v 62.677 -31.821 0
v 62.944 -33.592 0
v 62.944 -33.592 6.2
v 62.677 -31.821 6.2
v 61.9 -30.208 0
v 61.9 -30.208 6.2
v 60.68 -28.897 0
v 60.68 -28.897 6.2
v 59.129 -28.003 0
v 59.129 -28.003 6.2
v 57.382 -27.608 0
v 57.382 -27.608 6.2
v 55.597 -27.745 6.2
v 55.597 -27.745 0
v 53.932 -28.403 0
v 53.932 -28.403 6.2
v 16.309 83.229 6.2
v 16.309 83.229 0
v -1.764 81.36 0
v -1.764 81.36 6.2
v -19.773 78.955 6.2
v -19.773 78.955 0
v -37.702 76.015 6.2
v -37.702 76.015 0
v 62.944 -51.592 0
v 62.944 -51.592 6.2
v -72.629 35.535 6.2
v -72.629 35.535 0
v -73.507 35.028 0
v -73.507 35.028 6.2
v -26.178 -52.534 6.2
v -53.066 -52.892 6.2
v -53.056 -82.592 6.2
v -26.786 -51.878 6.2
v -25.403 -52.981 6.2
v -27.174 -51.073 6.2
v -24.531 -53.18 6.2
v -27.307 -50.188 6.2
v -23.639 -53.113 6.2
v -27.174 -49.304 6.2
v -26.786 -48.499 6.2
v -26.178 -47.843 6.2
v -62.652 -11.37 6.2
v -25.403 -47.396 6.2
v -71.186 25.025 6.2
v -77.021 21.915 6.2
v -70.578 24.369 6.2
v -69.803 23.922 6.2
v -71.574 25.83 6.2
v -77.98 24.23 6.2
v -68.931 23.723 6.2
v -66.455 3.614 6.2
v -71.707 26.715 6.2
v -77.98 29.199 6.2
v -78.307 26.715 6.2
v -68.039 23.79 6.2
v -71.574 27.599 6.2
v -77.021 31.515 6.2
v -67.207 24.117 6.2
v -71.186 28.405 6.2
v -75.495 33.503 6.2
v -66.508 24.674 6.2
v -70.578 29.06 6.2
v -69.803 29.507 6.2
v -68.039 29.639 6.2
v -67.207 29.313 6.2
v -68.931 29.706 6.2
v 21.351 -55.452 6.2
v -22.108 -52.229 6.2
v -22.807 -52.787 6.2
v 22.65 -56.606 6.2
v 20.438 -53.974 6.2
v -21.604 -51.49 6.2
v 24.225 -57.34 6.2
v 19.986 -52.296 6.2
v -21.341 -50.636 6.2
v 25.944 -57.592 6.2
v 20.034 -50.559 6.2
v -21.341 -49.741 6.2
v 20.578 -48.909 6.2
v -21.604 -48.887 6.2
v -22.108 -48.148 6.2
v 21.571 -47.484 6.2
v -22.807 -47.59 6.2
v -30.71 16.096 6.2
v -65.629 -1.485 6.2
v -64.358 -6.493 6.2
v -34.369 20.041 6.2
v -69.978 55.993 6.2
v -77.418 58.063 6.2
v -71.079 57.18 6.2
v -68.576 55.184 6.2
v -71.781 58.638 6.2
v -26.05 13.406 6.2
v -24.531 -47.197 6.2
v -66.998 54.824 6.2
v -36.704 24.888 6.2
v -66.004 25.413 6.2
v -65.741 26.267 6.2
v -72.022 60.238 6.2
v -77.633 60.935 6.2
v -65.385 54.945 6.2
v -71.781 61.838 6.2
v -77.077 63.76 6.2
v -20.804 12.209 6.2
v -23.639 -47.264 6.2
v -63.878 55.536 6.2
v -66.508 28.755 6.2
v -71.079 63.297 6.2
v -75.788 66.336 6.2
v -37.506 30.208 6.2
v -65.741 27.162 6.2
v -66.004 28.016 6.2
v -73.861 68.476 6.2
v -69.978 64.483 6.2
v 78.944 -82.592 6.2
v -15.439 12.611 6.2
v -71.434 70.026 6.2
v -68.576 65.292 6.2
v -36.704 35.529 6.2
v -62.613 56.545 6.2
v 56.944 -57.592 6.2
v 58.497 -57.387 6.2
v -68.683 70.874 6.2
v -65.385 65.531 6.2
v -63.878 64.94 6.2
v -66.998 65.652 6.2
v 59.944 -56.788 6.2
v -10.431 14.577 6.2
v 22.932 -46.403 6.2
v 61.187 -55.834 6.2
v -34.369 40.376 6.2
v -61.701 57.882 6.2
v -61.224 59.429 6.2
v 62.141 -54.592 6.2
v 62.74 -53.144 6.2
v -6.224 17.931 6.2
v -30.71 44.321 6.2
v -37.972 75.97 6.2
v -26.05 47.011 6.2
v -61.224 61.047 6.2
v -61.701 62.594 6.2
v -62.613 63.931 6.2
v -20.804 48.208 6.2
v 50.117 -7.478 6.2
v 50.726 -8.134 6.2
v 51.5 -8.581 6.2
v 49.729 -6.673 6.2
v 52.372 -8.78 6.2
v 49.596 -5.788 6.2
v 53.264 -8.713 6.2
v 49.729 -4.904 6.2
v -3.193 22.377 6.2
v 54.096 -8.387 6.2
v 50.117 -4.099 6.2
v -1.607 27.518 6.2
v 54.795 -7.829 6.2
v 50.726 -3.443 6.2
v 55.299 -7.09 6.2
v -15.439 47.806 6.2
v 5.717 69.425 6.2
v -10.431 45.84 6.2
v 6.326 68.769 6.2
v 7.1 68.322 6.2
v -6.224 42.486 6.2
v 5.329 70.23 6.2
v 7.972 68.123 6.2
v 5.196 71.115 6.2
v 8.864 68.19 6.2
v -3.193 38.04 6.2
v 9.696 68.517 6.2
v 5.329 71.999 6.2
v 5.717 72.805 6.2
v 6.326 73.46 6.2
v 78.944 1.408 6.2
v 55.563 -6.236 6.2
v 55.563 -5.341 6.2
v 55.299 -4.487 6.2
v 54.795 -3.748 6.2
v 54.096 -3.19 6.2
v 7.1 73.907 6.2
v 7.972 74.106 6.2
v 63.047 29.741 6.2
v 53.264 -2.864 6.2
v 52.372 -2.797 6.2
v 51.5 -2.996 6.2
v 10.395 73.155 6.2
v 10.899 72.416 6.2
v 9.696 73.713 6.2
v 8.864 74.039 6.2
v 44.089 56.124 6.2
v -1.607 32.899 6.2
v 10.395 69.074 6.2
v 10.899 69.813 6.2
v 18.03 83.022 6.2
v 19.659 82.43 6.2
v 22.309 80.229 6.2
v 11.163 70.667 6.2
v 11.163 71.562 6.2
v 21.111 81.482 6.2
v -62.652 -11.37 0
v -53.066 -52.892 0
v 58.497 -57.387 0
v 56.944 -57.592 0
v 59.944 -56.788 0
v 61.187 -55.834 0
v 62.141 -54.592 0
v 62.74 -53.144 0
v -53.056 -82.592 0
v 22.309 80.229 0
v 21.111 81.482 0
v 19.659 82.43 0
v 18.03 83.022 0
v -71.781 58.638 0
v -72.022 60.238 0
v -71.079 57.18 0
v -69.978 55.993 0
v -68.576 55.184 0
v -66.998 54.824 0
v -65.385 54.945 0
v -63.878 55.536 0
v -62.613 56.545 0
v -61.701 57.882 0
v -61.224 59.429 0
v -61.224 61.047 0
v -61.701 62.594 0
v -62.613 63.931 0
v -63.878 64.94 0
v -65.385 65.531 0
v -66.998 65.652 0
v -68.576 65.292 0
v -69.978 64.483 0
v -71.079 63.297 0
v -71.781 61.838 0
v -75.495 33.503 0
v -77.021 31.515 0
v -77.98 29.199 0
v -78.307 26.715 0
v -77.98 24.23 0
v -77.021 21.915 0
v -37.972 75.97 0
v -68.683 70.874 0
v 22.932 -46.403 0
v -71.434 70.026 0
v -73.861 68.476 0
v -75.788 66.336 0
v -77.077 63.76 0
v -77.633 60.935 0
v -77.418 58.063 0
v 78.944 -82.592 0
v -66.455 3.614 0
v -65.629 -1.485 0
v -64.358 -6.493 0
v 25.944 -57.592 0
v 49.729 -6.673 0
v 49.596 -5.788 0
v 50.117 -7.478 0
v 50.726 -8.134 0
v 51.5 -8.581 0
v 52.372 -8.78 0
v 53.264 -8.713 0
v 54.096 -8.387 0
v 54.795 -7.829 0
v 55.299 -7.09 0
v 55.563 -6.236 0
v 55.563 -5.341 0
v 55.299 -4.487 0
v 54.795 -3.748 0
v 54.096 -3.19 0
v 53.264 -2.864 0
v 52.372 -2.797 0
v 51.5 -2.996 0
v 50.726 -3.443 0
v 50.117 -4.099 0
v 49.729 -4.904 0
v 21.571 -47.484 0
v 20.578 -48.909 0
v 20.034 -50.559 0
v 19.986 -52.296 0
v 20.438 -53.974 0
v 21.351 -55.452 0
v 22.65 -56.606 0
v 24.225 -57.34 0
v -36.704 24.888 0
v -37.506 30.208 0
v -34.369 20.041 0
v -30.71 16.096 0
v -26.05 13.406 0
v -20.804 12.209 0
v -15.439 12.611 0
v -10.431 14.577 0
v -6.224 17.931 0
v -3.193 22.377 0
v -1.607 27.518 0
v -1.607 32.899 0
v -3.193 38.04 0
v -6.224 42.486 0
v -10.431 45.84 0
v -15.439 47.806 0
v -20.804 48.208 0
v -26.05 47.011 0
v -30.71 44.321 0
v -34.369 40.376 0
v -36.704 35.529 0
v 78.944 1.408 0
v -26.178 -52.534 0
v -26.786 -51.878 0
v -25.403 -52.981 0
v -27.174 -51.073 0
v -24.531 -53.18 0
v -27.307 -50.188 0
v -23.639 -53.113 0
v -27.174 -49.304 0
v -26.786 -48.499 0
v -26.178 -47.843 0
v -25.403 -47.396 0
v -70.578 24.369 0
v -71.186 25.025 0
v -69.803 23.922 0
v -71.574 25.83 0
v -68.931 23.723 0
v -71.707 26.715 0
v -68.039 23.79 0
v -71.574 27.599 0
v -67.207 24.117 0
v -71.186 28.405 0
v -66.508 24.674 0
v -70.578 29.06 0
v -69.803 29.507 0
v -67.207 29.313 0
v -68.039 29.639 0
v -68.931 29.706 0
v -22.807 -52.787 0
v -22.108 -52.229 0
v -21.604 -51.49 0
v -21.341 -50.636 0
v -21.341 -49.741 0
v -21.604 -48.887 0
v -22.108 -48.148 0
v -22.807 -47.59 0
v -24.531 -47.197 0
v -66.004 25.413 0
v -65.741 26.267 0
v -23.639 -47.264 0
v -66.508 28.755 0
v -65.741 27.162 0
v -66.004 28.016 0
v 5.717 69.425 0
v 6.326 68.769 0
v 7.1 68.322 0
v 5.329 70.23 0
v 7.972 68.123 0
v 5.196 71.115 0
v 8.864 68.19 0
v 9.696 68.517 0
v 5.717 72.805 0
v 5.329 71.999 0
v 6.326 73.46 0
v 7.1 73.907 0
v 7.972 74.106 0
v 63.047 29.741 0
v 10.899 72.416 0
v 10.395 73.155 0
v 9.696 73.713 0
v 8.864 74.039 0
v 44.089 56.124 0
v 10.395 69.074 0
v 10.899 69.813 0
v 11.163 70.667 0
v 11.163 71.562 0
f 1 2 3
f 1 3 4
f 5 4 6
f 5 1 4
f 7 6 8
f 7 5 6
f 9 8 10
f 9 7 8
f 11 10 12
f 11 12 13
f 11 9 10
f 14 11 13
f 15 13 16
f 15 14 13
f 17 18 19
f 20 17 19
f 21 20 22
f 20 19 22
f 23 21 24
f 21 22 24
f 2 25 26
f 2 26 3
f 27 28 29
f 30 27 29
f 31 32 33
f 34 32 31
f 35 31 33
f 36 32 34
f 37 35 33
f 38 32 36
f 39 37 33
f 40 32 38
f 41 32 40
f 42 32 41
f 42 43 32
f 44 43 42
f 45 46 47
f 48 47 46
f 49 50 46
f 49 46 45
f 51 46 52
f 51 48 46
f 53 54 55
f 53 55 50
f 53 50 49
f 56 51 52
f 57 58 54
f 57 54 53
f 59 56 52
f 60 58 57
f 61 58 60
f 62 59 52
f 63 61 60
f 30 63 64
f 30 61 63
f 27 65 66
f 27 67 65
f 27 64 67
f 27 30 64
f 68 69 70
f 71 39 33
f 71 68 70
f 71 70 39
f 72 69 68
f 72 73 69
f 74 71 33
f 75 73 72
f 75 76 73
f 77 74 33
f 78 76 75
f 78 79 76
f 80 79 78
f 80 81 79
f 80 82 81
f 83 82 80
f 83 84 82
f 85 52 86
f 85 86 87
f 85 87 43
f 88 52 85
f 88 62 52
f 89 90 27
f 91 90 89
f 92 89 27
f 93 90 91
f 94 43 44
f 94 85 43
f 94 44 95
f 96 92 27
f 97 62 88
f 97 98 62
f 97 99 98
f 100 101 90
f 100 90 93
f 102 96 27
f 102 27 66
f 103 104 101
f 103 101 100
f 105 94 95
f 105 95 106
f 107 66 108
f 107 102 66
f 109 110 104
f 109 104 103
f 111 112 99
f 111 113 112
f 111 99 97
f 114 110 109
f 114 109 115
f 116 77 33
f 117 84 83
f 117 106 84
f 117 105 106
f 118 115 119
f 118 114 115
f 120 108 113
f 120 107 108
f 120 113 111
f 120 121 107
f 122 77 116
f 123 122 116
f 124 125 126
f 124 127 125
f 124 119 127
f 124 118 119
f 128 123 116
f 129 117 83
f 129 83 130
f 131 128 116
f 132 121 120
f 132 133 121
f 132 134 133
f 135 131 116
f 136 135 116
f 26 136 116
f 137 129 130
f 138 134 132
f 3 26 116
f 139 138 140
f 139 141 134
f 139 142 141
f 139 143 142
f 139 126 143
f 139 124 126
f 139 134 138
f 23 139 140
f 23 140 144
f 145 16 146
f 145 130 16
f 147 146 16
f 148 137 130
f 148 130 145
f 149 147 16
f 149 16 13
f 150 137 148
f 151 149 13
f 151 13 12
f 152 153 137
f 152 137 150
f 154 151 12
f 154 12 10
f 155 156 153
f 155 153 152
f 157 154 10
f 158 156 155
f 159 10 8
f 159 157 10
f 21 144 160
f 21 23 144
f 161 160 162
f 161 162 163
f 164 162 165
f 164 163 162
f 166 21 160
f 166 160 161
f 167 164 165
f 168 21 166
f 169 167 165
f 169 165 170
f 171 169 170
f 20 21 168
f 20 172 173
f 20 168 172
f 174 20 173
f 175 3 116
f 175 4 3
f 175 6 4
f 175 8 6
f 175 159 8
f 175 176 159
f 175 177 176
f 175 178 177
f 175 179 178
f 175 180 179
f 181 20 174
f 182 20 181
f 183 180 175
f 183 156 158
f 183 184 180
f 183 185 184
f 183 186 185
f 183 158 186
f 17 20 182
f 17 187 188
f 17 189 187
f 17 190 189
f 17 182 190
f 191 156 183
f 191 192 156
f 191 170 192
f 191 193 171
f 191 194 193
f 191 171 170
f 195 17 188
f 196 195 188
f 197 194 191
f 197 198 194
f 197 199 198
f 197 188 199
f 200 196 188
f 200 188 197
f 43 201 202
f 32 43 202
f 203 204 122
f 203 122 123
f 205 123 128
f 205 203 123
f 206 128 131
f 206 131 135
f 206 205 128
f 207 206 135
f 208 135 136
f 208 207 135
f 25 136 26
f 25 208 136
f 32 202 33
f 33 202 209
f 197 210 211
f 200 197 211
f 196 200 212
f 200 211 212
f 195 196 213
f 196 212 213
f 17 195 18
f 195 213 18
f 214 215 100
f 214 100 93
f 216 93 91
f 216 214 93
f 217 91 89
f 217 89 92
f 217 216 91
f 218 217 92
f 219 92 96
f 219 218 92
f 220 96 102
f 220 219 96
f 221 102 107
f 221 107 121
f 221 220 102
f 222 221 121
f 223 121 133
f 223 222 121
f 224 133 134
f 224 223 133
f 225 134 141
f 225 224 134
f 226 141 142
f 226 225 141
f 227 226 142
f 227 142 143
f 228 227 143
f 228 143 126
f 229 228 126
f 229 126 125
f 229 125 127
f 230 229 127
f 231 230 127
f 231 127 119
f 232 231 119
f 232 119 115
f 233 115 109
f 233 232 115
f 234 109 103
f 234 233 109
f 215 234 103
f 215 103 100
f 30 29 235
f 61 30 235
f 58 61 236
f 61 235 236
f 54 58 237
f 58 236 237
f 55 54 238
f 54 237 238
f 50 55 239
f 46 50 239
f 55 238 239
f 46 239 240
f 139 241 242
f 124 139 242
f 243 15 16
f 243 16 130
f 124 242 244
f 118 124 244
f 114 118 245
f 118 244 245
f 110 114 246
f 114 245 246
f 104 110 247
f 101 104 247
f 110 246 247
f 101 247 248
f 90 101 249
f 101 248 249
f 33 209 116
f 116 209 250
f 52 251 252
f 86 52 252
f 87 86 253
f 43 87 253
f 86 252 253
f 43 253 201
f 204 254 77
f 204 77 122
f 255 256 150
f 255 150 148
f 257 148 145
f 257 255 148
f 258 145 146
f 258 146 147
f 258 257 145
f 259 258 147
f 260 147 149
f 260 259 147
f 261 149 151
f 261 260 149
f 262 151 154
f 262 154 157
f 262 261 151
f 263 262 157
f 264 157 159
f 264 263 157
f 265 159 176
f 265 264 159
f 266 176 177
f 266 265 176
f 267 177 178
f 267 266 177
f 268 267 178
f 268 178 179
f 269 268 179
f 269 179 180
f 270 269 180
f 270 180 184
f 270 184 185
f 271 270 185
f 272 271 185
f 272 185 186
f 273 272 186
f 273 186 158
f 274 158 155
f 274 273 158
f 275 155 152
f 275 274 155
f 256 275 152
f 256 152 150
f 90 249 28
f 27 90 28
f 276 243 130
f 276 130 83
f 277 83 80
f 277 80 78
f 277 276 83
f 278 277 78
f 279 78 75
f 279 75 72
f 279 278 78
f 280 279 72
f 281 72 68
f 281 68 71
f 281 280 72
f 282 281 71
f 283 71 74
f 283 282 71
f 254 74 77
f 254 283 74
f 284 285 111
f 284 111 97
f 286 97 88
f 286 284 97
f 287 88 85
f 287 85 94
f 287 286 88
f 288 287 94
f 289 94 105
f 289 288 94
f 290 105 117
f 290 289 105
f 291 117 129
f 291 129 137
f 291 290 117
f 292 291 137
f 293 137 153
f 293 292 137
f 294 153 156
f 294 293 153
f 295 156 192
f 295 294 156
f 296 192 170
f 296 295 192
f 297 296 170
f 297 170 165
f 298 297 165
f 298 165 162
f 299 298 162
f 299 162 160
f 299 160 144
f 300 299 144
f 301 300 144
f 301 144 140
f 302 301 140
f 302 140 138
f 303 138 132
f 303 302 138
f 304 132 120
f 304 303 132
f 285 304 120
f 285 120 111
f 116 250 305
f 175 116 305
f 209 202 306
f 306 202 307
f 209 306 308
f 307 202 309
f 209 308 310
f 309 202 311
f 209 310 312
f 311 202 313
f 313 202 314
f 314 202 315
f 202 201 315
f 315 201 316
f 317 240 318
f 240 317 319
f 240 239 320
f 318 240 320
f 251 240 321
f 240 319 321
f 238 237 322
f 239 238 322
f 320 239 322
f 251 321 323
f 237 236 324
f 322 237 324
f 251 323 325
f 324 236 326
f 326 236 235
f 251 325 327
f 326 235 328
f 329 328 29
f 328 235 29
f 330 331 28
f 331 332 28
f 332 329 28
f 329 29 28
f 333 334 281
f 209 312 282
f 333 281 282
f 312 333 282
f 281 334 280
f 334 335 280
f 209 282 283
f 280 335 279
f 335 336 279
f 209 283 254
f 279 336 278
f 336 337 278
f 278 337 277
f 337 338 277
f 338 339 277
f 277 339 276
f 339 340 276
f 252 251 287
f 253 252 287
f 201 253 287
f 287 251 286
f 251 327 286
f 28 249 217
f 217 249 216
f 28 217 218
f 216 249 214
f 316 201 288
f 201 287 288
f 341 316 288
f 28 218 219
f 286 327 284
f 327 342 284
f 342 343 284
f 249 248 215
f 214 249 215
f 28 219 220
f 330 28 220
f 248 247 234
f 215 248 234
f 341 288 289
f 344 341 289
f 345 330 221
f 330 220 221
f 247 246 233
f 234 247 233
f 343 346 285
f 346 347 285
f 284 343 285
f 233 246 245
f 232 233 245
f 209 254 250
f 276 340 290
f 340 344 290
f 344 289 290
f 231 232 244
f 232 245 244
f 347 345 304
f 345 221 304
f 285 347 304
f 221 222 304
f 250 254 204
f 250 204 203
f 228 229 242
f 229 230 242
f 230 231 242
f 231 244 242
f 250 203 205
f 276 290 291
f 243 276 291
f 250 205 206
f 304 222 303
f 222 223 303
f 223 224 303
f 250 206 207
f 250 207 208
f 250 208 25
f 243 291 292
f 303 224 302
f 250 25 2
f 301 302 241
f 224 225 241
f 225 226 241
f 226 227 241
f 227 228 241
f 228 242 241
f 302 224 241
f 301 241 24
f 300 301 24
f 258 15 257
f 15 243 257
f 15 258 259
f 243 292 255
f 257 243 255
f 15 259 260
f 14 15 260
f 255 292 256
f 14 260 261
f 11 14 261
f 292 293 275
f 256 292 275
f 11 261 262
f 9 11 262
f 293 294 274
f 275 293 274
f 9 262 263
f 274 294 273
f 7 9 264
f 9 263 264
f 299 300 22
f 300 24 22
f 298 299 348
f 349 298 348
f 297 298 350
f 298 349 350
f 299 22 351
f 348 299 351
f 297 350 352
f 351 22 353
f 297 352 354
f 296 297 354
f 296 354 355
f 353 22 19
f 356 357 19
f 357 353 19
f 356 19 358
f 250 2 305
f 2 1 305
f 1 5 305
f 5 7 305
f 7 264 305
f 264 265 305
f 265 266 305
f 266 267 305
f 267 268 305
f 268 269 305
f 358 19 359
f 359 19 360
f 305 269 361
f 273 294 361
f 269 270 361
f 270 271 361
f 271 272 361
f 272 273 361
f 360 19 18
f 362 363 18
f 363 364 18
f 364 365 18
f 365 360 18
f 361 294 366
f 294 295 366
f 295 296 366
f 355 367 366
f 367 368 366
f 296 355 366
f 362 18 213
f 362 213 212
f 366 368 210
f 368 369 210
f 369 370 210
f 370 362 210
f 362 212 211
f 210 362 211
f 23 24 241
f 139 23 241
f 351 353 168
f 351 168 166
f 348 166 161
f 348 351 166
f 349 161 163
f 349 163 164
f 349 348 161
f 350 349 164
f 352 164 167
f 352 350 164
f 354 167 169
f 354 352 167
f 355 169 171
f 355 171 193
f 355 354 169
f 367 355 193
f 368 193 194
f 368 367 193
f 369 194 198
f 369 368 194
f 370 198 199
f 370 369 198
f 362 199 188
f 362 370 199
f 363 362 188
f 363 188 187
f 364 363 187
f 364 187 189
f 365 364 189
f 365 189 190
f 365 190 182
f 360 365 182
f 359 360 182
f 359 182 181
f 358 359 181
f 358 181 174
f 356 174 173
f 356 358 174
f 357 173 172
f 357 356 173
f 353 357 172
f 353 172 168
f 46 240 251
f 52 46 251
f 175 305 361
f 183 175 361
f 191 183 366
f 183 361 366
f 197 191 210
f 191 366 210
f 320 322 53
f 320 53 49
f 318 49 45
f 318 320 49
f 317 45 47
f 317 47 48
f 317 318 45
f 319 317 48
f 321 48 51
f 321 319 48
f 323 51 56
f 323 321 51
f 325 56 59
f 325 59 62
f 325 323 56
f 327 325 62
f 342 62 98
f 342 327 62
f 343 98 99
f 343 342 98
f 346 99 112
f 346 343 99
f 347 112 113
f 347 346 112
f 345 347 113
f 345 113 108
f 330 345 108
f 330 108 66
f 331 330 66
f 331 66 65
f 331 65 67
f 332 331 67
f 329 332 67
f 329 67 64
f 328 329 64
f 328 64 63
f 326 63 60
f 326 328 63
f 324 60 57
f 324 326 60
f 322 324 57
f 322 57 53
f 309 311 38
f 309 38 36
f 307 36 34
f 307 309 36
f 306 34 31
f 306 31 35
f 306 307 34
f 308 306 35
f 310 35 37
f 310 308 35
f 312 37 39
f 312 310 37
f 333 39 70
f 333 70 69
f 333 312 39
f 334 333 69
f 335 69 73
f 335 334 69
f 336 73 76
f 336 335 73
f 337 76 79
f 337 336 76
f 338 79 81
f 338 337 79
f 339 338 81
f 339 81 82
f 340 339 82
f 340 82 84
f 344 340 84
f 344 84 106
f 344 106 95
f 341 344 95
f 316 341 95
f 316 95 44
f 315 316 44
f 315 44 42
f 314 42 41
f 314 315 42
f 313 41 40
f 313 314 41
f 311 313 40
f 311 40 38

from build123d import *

# Parameters (mm, degrees)
SKETCH1_R           = 5.42927296
SKETCH1_R_2         = 18.05
SKETCH1_R_3         = 3
BOSS_EXTRUDE1_DEPTH = 6.2


with BuildPart() as part:
    # Sketch1 → Boss-Extrude1 (new body)
    with BuildSketch(Plane.XY):
        with BuildLine():
            ThreePointArc((22.30856743, 80.228990984), (19.658905911, 82.429667946), (16.30856743, 83.228990984))
            ThreePointArc((16.30856743, 83.228990984), (-10.777239886, 80.224067192), (-37.702247141, 76.015206396))
            Line((-37.702247141, 76.015206396), (-37.971821537, 75.970473087))
            Line((-37.971821537, 75.970473087), (-68.682554074, 70.874318891))
            ThreePointArc((-68.682554074, 70.874318891), (-75.78826802, 66.335898634), (-77.417928756, 58.063496625))
            Line((-77.417928756, 58.063496625), (-72.629383419, 35.535152501))
            Line((-72.629383419, 35.535152501), (-73.507041371, 35.028436446))
            ThreePointArc((-73.507041371, 35.028436446), (-77.979929304, 29.199255403), (-77.020885248, 21.91459257))
            Line((-77.020885248, 21.91459257), (-66.455316905, 3.61449139))
            ThreePointArc((-66.455316905, 3.61449139), (-65.048189041, -4.003273118), (-62.651846579, -11.369947247))
            Line((-62.651846579, -11.369947247), (-53.06582932, -52.891535091))
            Line((-53.06582932, -52.891535091), (-53.055513447, -82.591545802))
            Line((-53.055513447, -82.591545802), (78.944486553, -82.591545802))
            Line((78.944486553, -82.591545802), (78.944486553, -50.191545802))
            Line((78.944486553, -50.191545802), (78.944486553, 1.408454198))
            ThreePointArc((78.944486553, 1.408454198), (53.936647448, 43.197185389), (22.30856743, 80.228990984))
        make_face()
        with Locations(Location((-66.592661175, 60.23811882, 0), (0, 0, 180))):
            Circle(SKETCH1_R, mode=Mode.SUBTRACT)
        with Locations(Location((-19.455513478, 30.208443842, 0), (0, 0, 180))):
            Circle(SKETCH1_R_2, mode=Mode.SUBTRACT)
        with Locations(Location((8.19601445, 71.114592564, 0), (0, 0, 180))):
            Circle(SKETCH1_R_3, mode=Mode.SUBTRACT)
        with Locations(Location((-24.307041406, -50.188463292, 0), (0, 0, 180))):
            Circle(SKETCH1_R_3, mode=Mode.SUBTRACT)
        with Locations(Location((-68.707041371, 26.71459257, 0), (0, 0, 180))):
            Circle(SKETCH1_R_3, mode=Mode.SUBTRACT)
        with Locations(Location((52.59601445, -5.788463292, 0), (0, 0, 180))):
            Circle(SKETCH1_R_3, mode=Mode.SUBTRACT)
        with BuildLine():
            ThreePointArc((22.931673418, -46.402822526), (20.150851995, -53.151619974), (25.944486522, -57.591556206))
            Line((25.944486522, -57.591556206), (56.944486522, -57.591556206))
            ThreePointArc((56.944486522, -57.591556206), (61.18712721, -55.834196893), (62.944486522, -51.591556206))
            Line((62.944486522, -51.591556206), (62.944486522, -33.591556206))
            ThreePointArc((62.944486522, -33.591556206), (59.938073115, -28.391706274), (53.931673418, -28.402822526))
            Line((53.931673418, -28.402822526), (22.931673418, -46.402822526))
        make_face(mode=Mode.SUBTRACT)
    extrude(amount=BOSS_EXTRUDE1_DEPTH)


solid = part.part
